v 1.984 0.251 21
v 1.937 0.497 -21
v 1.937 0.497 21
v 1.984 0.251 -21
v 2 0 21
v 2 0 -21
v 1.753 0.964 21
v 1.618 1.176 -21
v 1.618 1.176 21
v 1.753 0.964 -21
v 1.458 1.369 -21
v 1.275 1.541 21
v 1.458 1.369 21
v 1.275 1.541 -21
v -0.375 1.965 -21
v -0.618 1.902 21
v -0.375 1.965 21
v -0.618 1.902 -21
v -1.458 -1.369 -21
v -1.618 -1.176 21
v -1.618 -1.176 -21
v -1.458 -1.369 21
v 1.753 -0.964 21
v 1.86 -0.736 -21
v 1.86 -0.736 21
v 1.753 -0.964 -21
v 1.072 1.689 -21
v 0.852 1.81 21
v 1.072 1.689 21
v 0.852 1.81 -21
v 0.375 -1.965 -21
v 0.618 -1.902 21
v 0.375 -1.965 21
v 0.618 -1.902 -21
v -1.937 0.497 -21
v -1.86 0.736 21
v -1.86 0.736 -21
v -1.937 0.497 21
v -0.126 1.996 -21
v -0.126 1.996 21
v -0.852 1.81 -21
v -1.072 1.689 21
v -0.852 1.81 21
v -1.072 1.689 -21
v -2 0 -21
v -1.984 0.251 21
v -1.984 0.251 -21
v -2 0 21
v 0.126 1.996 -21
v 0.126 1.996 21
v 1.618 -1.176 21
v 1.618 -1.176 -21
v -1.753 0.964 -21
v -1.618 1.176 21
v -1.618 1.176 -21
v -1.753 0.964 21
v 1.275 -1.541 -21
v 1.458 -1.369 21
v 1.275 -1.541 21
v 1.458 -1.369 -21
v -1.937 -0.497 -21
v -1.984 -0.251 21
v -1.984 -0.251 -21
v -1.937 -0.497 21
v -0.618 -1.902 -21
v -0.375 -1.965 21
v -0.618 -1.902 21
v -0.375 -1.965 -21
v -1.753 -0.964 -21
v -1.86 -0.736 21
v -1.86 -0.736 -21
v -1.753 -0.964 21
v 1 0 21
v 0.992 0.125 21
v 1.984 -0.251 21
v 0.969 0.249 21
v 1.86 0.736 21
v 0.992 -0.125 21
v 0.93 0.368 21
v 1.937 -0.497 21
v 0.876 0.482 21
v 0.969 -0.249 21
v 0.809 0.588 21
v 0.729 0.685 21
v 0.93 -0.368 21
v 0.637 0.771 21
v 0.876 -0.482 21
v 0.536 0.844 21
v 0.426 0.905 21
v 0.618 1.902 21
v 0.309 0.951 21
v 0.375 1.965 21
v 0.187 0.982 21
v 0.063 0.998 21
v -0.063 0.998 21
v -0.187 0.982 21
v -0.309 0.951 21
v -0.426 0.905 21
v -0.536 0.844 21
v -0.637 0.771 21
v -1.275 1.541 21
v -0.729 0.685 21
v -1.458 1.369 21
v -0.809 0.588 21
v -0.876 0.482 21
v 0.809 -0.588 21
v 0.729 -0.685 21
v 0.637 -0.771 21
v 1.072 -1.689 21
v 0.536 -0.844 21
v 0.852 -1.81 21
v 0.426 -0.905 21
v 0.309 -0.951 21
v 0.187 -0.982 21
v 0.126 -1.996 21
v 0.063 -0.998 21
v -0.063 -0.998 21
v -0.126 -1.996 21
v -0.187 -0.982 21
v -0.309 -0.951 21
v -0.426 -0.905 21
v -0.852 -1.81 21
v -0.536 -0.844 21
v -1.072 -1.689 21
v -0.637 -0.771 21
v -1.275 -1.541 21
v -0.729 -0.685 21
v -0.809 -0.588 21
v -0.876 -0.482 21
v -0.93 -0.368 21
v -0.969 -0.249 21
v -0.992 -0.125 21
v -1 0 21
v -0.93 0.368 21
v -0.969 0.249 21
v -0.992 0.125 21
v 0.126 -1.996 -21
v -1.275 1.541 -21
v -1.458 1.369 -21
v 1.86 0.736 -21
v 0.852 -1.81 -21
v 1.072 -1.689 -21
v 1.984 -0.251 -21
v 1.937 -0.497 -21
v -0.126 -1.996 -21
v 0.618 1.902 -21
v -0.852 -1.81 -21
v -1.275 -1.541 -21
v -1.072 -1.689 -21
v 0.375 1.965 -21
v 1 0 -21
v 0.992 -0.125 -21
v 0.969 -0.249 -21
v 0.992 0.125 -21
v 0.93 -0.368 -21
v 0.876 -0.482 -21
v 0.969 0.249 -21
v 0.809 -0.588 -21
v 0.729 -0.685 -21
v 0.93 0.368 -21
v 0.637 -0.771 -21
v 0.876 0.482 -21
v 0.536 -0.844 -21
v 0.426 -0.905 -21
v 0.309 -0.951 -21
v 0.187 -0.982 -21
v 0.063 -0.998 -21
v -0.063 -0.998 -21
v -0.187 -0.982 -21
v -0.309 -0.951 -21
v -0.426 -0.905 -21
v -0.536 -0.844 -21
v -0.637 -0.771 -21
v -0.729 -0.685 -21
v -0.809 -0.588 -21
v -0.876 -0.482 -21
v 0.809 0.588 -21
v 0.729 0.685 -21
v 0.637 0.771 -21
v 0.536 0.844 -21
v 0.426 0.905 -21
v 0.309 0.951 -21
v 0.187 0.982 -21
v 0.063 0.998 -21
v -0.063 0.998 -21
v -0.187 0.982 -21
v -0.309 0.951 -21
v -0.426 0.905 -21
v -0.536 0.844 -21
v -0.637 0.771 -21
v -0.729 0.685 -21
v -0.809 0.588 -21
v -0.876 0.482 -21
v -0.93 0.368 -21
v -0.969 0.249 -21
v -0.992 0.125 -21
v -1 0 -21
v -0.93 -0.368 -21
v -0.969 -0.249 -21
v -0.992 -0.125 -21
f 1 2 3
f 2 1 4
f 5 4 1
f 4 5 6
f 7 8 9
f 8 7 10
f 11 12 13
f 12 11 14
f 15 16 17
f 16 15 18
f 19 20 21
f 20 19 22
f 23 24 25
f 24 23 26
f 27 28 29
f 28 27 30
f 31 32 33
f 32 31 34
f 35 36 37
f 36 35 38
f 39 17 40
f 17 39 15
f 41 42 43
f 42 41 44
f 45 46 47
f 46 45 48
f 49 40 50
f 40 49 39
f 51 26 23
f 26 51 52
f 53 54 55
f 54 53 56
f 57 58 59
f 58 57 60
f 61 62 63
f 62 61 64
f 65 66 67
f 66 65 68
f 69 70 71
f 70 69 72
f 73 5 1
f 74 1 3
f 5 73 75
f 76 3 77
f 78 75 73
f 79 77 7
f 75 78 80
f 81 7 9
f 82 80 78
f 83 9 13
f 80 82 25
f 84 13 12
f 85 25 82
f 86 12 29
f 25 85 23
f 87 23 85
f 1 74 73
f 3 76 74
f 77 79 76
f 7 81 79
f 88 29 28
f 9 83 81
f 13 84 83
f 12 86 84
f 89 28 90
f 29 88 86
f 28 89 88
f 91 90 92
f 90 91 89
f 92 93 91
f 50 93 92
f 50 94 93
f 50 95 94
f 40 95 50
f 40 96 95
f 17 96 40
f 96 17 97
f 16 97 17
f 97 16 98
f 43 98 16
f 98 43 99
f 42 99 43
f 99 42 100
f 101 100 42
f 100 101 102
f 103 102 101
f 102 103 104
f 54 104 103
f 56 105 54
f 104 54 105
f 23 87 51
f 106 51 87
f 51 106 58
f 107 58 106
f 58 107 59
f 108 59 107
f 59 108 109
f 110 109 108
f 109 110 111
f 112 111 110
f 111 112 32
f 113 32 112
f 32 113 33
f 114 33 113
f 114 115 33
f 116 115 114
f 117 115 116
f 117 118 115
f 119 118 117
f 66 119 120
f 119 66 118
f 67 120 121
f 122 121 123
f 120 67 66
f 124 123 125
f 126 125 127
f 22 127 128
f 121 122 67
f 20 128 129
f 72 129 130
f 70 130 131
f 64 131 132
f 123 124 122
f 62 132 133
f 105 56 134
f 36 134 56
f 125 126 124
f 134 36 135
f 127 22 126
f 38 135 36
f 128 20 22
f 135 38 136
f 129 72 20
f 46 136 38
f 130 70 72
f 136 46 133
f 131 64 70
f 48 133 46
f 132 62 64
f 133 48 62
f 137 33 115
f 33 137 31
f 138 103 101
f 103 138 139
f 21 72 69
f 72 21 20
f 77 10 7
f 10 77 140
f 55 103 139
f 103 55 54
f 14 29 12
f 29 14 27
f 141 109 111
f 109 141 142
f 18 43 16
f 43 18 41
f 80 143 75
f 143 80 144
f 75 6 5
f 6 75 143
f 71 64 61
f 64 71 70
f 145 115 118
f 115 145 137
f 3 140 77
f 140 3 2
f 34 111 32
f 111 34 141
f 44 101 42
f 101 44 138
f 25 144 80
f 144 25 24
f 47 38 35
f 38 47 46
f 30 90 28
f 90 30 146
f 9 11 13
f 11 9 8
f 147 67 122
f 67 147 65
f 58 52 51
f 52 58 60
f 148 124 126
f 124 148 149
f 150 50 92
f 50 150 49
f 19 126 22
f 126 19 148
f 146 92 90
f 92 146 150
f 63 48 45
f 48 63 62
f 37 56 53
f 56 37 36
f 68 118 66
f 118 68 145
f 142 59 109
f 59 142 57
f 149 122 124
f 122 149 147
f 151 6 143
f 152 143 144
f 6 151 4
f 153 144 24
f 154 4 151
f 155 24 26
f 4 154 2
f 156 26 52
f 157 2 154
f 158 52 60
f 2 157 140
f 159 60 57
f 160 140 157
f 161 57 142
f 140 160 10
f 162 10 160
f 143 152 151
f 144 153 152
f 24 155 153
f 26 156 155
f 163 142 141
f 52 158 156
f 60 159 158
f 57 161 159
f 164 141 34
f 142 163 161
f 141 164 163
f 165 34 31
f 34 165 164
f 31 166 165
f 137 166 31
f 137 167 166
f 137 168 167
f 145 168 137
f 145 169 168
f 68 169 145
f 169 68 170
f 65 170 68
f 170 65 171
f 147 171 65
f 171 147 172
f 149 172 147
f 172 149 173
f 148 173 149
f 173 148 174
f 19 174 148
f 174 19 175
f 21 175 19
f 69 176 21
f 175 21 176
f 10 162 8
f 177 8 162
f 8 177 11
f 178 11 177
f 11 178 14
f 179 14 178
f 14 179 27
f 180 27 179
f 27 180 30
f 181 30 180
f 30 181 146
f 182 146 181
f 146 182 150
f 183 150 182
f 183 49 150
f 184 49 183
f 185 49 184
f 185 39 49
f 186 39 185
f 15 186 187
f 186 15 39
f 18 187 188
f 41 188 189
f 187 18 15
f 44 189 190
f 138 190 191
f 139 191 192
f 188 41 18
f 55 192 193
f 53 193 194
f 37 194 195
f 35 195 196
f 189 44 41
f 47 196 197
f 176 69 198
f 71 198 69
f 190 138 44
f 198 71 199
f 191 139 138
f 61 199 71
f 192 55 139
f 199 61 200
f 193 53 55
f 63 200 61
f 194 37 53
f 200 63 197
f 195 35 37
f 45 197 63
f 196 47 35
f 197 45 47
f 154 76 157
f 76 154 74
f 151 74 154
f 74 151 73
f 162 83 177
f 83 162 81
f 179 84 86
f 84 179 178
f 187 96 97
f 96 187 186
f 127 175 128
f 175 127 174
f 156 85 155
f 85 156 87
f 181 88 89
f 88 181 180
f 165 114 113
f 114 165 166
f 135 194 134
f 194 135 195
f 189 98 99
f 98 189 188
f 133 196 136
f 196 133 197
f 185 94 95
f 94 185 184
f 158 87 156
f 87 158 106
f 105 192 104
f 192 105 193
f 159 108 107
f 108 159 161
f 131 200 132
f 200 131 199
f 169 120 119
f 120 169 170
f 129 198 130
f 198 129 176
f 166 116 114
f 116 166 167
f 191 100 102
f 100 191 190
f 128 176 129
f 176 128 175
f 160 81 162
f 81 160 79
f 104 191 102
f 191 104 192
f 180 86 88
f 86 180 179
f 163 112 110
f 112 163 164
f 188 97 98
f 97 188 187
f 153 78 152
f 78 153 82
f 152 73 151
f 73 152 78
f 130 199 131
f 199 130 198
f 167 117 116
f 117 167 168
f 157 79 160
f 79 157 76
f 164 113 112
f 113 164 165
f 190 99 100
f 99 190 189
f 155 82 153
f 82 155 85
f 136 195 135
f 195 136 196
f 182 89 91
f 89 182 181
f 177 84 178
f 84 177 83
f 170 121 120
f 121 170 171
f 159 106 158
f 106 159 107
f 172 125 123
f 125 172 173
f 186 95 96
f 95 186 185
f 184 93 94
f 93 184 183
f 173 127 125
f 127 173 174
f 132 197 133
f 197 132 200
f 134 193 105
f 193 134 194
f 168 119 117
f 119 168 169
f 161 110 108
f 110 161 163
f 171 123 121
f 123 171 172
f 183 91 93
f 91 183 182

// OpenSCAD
$fn = 50;


difference() {
	union() {
		translate(v = [0, 0, -21.0000000000]) {
			cylinder(h = 42, r = 2.0000000000);
		}
	}
	union() {
		translate(v = [0, 0, -100.0000000000]) {
			cylinder(h = 200, r = 1.0000000000);
		}
	}
}
